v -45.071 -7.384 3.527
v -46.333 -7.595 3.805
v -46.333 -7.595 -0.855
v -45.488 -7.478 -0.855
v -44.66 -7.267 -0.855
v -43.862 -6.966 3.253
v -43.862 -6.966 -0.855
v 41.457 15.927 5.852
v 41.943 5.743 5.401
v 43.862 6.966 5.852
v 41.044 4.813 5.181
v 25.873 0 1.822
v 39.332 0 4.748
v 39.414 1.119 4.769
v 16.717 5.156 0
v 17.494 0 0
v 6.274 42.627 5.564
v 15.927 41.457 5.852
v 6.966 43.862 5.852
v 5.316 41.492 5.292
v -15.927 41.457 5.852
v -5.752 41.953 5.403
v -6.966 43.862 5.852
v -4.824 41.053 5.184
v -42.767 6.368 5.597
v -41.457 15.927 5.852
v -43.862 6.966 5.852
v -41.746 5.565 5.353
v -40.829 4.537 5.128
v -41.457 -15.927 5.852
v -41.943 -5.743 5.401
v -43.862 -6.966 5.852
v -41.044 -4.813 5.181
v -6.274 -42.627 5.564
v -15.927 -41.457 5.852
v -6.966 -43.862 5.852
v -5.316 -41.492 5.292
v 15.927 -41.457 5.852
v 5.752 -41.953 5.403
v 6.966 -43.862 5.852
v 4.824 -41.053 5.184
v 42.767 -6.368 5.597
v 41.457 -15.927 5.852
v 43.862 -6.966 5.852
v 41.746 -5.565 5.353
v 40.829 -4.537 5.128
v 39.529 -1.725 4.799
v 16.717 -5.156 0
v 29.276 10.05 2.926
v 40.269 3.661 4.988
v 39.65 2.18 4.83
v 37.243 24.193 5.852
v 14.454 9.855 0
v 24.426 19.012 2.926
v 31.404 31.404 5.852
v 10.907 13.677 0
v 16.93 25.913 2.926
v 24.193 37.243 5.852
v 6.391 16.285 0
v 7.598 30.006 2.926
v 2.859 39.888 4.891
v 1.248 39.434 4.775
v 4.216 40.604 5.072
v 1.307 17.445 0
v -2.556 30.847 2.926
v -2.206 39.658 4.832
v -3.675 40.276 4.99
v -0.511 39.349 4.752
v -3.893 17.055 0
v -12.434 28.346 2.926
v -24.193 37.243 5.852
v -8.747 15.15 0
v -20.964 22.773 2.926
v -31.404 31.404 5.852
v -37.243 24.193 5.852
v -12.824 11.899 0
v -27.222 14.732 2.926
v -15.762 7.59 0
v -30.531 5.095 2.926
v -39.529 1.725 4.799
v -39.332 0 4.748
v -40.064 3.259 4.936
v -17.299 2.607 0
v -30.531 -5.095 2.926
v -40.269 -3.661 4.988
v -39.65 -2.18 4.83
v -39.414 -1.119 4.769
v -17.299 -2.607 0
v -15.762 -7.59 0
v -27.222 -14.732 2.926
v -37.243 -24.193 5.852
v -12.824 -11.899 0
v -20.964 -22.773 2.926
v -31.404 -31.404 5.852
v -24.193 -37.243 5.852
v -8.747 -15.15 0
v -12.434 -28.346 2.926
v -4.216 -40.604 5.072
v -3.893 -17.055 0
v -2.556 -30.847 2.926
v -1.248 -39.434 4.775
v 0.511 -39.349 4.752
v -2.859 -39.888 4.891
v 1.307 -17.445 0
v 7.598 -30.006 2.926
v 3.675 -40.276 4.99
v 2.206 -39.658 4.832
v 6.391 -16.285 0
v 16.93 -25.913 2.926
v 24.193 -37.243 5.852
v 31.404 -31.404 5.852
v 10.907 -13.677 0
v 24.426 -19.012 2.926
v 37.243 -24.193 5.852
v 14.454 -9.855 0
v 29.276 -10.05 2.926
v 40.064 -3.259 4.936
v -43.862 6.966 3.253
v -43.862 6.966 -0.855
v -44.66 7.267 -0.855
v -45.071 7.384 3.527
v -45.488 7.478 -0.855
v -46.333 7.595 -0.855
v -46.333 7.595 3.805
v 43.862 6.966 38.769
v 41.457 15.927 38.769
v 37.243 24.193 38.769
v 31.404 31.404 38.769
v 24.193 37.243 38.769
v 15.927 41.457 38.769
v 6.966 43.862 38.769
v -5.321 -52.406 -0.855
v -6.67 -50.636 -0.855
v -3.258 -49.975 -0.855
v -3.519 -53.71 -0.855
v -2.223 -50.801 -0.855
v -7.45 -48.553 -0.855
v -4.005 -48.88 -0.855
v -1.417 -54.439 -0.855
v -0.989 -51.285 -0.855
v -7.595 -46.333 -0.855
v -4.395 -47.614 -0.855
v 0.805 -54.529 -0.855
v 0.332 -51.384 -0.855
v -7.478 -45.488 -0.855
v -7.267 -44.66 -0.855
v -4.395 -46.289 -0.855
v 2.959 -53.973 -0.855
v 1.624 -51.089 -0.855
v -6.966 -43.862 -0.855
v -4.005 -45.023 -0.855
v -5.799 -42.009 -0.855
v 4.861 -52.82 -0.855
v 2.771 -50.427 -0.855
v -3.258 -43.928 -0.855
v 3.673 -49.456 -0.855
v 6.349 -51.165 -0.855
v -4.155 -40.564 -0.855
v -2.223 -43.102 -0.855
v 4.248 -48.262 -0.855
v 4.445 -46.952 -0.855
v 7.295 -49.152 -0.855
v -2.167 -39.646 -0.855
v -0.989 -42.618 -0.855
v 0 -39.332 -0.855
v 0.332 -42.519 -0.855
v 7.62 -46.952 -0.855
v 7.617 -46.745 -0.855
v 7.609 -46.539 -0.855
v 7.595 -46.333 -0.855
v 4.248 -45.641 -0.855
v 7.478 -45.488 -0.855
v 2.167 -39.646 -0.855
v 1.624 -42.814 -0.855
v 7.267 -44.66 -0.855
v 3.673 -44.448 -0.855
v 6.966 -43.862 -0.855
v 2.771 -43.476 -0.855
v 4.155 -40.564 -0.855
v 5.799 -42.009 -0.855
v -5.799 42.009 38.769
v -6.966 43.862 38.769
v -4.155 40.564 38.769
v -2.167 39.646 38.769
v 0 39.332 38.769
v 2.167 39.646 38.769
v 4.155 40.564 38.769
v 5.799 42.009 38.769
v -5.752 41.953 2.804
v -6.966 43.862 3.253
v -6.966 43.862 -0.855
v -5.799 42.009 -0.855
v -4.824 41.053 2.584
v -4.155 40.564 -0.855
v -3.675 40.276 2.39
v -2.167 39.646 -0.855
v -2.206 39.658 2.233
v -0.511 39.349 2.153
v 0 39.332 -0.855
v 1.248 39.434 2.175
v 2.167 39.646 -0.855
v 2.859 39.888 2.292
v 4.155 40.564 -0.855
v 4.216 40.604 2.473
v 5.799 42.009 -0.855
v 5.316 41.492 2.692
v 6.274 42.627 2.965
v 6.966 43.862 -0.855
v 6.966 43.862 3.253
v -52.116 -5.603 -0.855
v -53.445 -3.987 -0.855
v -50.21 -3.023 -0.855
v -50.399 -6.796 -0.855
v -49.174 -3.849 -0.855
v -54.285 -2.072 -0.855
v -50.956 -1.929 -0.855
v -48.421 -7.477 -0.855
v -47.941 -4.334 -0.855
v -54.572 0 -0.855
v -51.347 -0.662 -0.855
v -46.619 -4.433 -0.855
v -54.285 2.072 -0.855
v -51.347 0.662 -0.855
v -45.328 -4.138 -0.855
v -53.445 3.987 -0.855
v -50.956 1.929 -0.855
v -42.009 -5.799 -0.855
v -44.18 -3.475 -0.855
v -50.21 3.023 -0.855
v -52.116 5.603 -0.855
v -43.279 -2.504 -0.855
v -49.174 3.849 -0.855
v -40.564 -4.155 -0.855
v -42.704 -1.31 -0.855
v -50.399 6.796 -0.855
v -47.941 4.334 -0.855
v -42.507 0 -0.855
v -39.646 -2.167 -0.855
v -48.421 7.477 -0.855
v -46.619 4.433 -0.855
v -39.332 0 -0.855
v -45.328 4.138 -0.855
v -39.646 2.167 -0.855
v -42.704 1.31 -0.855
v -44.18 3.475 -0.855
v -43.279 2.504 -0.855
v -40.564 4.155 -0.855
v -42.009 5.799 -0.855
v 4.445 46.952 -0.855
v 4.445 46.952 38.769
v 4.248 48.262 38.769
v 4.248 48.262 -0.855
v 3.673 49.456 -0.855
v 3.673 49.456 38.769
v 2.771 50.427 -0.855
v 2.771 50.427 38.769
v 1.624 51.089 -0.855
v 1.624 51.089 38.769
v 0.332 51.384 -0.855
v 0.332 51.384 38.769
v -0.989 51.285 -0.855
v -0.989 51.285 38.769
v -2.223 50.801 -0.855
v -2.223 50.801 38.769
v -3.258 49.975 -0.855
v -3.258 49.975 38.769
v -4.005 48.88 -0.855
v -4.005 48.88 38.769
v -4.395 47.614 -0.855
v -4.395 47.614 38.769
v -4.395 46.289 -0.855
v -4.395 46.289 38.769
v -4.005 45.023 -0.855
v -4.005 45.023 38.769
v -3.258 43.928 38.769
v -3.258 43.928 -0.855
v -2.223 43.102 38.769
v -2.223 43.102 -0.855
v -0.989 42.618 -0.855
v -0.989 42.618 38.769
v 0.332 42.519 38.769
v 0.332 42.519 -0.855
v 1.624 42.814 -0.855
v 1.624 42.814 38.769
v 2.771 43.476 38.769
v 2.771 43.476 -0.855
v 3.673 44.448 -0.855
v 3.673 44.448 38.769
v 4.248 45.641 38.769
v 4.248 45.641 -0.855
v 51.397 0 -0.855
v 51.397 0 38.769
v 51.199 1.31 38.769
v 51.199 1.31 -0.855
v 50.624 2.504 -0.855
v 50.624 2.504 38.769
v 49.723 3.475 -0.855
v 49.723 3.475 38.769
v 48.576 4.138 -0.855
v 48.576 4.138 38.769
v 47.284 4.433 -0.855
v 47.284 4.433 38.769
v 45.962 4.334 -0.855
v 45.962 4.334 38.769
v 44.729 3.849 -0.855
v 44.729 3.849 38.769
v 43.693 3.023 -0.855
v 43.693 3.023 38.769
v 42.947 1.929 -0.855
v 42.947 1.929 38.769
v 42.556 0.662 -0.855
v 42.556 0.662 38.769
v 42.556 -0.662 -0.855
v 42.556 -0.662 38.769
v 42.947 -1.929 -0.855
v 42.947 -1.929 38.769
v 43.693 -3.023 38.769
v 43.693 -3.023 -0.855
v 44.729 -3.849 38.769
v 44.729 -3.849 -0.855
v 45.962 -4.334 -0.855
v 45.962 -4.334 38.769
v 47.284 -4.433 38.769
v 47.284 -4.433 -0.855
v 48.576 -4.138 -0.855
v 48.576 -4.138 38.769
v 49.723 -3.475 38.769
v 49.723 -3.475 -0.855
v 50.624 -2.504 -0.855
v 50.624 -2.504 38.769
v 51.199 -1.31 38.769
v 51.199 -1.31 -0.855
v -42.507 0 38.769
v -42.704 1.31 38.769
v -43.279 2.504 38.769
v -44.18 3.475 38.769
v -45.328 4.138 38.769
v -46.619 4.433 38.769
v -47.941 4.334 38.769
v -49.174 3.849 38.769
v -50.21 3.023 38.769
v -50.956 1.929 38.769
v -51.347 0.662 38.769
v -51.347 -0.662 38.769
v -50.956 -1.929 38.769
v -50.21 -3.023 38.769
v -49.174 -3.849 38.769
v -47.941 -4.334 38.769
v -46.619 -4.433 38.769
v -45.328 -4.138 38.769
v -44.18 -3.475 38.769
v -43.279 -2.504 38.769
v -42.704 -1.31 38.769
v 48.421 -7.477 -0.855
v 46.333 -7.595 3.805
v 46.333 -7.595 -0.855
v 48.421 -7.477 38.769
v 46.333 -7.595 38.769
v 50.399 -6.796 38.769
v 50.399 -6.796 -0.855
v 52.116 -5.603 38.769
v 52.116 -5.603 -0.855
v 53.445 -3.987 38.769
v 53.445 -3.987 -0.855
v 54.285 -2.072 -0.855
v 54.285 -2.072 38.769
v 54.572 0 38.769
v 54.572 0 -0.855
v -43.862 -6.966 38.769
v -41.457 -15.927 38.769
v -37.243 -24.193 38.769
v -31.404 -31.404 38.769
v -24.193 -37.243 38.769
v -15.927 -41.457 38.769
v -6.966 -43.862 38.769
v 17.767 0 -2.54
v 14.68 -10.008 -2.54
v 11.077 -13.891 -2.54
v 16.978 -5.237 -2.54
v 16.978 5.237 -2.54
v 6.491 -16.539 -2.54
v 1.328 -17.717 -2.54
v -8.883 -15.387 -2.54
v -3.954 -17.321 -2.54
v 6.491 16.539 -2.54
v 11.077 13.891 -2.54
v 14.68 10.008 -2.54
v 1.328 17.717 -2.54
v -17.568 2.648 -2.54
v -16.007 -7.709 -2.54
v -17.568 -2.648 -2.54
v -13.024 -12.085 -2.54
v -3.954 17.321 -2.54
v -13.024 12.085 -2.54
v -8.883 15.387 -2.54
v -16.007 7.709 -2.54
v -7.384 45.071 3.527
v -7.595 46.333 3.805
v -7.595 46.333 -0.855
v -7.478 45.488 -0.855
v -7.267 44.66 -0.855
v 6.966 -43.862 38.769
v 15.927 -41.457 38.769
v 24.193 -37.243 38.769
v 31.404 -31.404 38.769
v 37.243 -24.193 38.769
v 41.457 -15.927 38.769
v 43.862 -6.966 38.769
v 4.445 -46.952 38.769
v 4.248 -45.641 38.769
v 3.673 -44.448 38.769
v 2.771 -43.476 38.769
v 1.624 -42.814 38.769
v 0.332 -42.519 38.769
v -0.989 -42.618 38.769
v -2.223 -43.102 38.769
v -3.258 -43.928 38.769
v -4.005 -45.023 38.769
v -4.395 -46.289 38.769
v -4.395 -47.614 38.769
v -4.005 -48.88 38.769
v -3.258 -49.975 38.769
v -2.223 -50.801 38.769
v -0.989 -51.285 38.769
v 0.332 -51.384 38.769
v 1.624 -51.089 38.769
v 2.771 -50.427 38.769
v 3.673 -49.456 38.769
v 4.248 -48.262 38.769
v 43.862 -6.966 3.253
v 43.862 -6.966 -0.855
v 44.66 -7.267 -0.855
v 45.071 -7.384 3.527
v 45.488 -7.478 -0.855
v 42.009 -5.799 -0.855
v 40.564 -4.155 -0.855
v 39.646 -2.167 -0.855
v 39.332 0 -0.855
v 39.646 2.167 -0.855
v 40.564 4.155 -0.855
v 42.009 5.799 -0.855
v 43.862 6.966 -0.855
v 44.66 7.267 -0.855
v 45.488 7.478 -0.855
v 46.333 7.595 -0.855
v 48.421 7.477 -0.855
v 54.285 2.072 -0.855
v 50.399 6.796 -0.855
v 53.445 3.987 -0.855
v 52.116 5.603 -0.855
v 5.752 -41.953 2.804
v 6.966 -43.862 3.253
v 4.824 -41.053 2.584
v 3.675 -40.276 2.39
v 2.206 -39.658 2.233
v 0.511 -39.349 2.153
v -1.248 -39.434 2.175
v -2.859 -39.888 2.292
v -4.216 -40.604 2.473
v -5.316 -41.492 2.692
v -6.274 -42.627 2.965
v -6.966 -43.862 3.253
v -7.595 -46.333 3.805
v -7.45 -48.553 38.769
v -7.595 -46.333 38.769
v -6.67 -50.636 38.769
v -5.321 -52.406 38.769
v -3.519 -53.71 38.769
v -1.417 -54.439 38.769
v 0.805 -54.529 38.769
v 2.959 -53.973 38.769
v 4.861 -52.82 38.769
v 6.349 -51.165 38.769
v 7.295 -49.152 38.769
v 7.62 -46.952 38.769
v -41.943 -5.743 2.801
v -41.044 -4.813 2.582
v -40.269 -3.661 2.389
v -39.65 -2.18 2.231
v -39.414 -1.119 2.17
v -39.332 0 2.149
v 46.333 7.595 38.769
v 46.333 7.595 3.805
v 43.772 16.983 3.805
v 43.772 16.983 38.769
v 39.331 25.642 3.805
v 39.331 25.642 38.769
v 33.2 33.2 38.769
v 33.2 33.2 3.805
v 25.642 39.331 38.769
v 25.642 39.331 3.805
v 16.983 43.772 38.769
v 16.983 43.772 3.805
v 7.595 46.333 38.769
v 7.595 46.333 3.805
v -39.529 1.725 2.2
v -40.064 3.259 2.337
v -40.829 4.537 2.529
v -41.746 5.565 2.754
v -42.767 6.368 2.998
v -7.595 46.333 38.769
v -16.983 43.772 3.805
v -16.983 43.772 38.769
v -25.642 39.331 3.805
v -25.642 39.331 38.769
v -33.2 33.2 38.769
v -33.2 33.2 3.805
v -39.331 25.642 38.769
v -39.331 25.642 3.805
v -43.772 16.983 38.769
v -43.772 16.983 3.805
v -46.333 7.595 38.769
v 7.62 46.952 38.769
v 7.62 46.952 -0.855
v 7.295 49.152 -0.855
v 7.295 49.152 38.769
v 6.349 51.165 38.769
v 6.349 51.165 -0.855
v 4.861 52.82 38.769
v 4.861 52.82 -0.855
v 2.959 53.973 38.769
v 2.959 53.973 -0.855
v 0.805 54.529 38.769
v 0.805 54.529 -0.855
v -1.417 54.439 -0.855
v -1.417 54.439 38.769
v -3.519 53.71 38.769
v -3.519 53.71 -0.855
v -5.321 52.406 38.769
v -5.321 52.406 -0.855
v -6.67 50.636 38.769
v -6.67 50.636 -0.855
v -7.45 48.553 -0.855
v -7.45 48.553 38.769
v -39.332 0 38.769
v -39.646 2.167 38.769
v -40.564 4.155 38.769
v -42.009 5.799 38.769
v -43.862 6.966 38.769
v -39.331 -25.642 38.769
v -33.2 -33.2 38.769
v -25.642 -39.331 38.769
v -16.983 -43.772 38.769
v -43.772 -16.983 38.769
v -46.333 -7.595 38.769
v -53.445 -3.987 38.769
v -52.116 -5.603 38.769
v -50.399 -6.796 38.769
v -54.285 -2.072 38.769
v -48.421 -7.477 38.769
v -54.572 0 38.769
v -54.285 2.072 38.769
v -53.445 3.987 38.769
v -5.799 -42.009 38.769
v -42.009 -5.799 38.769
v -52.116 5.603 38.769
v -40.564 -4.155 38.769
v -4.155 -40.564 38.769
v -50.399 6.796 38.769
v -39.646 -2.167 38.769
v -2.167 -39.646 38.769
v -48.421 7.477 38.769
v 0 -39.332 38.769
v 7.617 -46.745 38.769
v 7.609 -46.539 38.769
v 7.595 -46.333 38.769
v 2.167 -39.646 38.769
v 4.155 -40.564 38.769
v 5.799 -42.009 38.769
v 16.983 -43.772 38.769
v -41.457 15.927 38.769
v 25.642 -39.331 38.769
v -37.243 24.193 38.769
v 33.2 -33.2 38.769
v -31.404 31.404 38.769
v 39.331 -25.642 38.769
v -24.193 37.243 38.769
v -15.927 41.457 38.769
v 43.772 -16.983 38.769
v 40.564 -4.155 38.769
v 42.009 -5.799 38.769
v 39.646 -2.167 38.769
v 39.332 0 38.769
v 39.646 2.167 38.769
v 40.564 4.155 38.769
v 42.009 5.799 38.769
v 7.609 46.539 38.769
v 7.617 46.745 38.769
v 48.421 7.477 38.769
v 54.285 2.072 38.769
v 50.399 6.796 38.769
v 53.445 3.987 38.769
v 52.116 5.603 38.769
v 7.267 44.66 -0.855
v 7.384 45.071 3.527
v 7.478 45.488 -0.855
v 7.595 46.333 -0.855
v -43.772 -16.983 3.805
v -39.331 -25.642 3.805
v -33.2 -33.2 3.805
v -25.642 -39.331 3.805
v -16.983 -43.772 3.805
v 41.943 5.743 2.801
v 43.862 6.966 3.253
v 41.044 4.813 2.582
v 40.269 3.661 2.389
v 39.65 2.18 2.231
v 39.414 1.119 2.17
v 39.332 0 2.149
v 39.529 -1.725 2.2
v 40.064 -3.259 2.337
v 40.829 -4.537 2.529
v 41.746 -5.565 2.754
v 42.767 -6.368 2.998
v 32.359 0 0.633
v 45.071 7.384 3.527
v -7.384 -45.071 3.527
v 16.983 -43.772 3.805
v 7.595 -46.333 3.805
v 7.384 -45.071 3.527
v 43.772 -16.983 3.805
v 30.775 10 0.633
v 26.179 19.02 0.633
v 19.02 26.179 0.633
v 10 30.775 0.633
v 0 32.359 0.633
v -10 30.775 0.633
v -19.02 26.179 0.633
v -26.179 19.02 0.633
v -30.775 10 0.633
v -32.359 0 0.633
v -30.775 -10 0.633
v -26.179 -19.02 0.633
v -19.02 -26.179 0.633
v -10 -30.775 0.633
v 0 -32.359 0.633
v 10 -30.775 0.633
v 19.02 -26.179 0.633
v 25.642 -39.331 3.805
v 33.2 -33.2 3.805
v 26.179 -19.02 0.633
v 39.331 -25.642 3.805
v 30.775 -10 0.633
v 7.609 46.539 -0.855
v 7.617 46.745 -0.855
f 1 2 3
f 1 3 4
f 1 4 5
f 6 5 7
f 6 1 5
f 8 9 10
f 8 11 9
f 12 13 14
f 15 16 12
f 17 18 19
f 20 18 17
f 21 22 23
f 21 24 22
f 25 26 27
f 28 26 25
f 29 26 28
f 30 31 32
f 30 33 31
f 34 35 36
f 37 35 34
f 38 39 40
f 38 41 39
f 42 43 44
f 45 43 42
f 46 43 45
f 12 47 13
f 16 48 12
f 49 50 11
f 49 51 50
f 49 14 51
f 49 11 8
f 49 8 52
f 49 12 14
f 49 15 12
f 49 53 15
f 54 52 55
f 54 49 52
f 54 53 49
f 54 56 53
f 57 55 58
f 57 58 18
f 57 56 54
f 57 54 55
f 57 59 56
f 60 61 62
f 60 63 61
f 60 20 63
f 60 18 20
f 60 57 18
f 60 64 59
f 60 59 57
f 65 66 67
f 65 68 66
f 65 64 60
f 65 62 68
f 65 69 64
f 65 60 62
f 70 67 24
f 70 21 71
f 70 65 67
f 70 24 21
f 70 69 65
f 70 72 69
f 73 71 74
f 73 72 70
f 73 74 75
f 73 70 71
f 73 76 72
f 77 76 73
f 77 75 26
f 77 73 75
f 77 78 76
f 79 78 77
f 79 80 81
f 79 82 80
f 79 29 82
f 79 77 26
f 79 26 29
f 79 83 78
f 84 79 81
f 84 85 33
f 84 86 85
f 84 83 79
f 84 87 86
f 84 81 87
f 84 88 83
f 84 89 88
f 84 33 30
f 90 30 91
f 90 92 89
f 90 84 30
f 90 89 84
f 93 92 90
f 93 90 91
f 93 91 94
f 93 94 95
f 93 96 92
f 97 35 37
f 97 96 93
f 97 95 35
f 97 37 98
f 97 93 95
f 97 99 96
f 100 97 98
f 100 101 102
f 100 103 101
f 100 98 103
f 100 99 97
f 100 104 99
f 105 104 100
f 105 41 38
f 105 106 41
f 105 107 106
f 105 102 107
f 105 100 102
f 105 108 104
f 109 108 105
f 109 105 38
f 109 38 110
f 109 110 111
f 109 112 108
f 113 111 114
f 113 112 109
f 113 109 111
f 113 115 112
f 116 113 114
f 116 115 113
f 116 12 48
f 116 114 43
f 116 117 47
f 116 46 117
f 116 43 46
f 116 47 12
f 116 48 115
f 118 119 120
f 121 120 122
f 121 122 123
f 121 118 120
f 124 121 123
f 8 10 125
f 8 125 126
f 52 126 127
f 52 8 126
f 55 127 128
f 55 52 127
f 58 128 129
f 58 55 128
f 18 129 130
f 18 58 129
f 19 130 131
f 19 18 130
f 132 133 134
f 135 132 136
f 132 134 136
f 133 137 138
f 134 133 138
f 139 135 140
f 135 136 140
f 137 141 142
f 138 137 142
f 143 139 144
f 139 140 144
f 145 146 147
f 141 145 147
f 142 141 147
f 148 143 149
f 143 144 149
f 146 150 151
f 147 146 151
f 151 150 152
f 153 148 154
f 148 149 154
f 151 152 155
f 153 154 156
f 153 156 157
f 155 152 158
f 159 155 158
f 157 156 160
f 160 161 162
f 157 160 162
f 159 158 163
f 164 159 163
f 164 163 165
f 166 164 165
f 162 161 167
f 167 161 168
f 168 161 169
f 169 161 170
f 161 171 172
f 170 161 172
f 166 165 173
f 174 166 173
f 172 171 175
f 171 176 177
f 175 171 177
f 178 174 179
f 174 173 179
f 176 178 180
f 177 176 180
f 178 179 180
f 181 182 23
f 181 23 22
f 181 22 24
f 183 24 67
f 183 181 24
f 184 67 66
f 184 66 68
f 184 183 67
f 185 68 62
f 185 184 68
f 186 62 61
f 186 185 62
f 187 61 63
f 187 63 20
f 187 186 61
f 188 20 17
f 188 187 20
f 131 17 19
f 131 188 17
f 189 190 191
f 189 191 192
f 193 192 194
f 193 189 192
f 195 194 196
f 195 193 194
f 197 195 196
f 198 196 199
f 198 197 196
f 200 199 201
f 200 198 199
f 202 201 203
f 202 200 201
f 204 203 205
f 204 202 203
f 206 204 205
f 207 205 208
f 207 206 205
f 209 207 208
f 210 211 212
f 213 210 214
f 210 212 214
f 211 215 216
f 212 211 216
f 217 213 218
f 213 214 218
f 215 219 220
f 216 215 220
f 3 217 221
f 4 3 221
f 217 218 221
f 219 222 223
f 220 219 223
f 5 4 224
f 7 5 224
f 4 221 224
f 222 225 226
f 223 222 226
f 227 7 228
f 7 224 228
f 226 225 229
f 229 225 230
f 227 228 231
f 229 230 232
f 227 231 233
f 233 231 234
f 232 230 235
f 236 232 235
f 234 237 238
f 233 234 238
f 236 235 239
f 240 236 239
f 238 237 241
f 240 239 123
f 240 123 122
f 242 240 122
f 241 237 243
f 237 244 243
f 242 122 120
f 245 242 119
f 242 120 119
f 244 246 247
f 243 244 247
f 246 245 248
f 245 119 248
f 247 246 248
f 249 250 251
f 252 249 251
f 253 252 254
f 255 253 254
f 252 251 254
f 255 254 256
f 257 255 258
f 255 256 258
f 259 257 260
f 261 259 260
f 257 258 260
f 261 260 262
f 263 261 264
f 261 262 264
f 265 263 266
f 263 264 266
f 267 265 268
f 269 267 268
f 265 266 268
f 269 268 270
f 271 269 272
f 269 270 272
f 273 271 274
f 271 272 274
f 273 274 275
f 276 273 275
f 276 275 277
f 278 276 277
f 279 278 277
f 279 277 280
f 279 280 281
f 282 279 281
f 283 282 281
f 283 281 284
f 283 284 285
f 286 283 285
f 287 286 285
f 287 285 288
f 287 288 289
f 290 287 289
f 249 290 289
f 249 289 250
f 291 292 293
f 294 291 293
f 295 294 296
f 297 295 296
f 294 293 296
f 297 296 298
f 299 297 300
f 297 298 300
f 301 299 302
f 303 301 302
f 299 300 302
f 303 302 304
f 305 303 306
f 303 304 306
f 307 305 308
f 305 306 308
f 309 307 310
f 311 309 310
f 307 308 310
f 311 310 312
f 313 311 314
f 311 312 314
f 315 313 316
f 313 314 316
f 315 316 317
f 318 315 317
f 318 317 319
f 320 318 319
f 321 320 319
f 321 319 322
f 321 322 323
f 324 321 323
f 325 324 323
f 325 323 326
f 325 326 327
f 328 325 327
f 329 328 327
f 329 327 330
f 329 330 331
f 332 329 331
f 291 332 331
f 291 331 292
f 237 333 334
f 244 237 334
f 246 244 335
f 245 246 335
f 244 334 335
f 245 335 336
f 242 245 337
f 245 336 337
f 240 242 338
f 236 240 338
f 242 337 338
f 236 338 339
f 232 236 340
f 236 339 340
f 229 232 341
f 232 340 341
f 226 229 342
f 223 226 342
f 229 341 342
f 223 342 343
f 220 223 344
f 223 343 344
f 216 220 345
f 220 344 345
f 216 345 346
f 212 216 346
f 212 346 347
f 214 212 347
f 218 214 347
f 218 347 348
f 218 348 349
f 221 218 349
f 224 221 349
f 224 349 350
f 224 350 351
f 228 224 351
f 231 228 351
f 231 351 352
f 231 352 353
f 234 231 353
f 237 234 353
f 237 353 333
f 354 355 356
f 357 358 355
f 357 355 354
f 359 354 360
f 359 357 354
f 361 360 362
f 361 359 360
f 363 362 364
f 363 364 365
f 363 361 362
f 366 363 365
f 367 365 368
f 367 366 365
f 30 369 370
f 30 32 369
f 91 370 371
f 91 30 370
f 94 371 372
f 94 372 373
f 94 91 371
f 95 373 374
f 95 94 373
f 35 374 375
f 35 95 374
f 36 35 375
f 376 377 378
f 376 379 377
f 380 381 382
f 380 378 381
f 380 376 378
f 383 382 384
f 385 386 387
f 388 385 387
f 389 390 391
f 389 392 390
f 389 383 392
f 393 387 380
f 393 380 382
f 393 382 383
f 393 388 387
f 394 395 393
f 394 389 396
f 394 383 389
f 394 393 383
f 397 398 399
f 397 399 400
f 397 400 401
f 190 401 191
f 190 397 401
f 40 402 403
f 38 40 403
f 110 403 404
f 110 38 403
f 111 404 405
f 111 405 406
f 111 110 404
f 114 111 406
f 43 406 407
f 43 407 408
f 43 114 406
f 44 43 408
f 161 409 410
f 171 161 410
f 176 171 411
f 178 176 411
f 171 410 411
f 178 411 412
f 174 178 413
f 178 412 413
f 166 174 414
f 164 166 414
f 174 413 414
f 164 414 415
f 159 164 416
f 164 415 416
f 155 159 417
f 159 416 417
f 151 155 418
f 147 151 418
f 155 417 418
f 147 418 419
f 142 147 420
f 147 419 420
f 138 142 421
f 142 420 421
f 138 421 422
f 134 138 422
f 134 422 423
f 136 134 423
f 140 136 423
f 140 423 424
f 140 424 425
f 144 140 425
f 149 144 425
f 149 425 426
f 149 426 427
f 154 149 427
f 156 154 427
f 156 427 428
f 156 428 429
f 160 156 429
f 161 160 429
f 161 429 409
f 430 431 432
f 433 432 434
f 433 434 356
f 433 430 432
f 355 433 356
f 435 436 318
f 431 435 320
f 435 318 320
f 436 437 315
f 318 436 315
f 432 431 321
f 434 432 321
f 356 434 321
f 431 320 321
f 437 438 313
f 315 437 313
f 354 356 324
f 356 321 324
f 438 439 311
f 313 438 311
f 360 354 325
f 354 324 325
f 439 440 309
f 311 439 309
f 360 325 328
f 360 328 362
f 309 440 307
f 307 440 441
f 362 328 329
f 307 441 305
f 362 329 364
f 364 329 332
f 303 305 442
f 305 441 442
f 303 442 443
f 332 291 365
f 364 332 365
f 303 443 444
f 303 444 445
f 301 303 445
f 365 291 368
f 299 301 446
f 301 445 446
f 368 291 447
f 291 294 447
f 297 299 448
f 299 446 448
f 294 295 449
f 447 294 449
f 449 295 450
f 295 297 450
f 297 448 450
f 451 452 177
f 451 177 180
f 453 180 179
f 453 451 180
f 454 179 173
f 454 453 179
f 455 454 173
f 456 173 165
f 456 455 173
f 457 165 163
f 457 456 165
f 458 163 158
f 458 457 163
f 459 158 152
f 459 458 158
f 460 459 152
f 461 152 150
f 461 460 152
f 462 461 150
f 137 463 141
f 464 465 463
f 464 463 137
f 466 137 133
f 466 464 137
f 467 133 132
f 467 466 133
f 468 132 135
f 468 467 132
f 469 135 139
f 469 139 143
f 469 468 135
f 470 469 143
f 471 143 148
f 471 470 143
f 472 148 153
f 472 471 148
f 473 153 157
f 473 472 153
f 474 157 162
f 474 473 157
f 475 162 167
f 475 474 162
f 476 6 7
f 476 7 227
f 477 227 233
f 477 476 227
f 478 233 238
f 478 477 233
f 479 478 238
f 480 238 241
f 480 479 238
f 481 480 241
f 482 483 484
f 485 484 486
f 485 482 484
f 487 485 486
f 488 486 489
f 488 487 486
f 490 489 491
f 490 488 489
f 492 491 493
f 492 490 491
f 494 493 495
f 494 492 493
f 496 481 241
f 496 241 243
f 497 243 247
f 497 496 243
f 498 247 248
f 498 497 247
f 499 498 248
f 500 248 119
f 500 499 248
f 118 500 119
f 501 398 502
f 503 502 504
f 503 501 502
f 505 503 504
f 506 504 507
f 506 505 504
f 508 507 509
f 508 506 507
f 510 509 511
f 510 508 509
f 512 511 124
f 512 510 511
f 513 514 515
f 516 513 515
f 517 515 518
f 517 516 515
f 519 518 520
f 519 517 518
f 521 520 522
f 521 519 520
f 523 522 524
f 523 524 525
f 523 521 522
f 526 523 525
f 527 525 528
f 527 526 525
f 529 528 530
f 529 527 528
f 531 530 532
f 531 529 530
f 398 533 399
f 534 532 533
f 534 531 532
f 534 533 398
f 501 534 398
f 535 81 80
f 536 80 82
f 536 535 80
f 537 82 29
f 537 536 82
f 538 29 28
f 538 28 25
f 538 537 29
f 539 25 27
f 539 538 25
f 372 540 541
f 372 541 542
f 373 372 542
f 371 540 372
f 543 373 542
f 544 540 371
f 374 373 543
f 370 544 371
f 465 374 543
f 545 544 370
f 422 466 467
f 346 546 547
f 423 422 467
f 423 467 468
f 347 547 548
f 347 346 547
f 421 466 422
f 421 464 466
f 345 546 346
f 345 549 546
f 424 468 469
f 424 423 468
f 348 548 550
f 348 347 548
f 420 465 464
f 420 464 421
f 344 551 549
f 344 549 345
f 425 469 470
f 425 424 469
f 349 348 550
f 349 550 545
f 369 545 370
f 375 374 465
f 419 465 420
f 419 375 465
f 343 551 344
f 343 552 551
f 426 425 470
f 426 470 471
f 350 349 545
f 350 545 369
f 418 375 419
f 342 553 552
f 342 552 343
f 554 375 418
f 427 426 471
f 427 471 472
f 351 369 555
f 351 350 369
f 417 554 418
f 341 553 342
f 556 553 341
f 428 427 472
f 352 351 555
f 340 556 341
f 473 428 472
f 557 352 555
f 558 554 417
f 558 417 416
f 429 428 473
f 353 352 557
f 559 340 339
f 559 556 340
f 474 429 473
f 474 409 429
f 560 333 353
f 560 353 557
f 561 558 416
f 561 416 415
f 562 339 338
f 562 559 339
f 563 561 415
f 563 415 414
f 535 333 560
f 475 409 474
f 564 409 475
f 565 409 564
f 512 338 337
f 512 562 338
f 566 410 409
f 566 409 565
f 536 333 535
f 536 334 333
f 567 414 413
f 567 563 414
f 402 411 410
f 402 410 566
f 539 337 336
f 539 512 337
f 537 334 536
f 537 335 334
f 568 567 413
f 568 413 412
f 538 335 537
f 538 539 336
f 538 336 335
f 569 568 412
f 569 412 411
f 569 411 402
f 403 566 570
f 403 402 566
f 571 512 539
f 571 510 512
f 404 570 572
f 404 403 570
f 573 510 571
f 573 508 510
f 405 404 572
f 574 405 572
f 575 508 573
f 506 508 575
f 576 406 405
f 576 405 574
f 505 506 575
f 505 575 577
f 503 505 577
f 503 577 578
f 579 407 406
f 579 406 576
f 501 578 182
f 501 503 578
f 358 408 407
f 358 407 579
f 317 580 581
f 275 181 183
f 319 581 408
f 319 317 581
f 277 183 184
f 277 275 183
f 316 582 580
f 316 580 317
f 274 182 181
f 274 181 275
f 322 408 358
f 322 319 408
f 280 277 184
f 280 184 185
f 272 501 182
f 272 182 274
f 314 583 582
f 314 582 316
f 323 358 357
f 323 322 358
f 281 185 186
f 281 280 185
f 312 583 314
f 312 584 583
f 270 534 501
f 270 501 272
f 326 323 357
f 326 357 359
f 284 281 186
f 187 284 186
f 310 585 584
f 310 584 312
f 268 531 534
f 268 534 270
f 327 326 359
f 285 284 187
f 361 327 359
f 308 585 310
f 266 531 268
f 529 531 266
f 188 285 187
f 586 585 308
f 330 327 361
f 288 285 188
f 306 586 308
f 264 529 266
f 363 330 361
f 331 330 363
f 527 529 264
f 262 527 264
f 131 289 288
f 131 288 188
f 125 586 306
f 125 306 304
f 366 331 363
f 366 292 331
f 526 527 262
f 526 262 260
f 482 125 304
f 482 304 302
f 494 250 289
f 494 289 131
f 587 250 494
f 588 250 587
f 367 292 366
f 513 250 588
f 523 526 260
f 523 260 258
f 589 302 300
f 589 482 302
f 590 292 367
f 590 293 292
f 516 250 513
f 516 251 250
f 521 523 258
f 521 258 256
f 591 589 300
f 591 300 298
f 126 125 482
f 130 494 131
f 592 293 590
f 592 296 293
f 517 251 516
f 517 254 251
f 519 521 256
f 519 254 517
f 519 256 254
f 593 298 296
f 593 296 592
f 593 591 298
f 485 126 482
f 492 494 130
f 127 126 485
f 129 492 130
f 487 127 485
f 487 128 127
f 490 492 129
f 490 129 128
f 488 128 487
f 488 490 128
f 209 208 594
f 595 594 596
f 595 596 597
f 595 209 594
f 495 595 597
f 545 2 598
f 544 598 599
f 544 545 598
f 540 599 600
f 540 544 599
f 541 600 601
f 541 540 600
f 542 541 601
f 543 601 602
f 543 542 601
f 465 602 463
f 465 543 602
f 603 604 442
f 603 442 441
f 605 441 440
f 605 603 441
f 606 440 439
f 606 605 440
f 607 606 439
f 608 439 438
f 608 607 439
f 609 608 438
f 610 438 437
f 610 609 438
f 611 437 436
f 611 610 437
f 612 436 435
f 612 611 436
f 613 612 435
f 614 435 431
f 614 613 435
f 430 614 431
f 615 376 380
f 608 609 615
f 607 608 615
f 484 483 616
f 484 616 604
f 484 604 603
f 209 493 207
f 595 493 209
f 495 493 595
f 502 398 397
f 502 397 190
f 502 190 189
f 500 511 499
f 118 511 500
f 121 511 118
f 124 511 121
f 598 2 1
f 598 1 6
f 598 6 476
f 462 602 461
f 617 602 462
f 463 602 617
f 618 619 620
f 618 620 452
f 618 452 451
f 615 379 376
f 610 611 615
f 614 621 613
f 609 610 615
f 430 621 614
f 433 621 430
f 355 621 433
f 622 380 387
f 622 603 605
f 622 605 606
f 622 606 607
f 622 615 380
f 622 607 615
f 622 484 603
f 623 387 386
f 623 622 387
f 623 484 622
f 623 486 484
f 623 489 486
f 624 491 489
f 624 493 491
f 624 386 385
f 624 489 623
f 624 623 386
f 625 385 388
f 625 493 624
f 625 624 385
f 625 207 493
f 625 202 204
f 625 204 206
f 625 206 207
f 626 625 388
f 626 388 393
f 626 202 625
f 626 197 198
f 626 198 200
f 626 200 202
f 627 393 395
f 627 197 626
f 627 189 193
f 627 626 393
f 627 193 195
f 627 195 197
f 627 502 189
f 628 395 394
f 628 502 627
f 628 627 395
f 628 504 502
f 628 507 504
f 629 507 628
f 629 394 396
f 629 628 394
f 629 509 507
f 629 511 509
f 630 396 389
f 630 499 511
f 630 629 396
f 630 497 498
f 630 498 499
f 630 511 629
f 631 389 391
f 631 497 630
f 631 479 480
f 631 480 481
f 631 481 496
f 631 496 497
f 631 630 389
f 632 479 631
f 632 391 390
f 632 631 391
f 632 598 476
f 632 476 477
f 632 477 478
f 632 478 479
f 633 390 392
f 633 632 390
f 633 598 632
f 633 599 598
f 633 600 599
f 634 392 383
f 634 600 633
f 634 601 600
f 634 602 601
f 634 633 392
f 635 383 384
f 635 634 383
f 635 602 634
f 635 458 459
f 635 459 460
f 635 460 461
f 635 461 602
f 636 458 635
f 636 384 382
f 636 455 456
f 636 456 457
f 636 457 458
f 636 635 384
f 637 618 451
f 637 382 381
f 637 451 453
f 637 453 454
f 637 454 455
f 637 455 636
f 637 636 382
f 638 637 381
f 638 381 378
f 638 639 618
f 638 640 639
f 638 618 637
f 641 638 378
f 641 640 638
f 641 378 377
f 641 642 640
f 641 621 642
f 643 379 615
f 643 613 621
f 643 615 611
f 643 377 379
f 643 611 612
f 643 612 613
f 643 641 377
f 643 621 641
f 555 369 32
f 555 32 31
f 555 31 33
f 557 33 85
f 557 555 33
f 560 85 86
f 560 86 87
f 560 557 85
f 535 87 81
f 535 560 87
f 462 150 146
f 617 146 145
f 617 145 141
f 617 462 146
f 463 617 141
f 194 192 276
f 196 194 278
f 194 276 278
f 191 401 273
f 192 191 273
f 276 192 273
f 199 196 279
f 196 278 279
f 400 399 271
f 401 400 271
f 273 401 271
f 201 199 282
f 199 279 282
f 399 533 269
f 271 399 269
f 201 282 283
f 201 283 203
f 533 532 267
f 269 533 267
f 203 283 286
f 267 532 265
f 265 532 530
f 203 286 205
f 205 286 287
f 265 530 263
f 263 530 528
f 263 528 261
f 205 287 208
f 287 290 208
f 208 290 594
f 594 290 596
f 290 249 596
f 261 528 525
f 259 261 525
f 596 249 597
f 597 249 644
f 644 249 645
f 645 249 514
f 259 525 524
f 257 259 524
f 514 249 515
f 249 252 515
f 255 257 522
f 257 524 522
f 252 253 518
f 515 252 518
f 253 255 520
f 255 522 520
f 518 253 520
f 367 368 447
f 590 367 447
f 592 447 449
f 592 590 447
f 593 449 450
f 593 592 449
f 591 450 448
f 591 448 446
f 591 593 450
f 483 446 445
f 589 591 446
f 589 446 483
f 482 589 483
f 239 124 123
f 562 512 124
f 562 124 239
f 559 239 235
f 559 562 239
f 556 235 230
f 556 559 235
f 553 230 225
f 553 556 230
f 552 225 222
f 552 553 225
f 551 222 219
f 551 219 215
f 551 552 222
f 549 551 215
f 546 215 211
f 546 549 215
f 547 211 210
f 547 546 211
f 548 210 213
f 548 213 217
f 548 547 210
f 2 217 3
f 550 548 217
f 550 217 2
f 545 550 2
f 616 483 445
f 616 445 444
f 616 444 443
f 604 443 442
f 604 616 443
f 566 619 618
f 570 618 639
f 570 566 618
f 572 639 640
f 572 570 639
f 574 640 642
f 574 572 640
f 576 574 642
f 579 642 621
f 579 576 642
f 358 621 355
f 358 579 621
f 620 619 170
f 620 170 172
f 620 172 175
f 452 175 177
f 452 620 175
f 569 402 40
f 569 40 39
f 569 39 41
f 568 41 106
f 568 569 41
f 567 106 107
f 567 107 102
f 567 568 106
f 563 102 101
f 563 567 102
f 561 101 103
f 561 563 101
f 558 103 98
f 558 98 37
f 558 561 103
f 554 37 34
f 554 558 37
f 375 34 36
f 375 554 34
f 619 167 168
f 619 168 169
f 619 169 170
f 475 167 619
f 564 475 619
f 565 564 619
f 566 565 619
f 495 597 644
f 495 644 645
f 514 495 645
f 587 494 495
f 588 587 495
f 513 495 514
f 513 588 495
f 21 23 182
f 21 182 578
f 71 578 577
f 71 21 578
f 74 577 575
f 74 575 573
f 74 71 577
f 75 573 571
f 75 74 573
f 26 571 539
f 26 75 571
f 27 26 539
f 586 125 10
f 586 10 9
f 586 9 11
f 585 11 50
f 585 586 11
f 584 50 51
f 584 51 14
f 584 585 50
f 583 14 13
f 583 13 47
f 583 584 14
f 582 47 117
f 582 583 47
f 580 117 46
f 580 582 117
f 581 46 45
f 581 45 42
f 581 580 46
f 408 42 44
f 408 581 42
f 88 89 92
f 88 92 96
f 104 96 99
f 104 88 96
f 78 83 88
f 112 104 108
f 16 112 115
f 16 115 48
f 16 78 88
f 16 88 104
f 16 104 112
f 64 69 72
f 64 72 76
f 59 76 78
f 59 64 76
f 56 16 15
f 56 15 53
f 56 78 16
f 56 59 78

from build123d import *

# Parameters (mm, degrees)
F3_DEPTH = 39.624
F4_R     = 4.445
F5_DEPTH = 41.3102415224


with BuildPart() as f1:
    # F0 (on Front) → F1 (revolve)
    with BuildSketch(Plane.XZ):
        Polygon((17.4939688295, 0), (0, 0), (0, -2.54), (17.7669053052, -2.54), (46.9515744454, 3.8053627059), (46.9515744454, 38.7692414224), (44.4115744454, 38.7692414224), (44.4115744454, 5.8524552733), align=None)
    revolve(axis=Axis((0, 0, 19.3846207112), (0, 0, 1)))

    # F2 (on face) → F3 (join)
    with BuildSketch(Plane.XY.offset(38.7692414224)):
        with BuildLine():
            ThreePointArc((-7.5948700673, -46.333230964), (-0.3094269601, -54.5652893703), (7.62, -46.9515744454))
            ThreePointArc((7.62, -46.9515744454), (7.6137149248, -46.6421474854), (7.5948700673, -46.333230964))
            ThreePointArc((7.5948700673, -46.333230964), (0, -46.9515744454), (-7.5948700673, -46.333230964))
        make_face()
        with BuildLine():
            ThreePointArc((7.62, 46.9515744454), (-0.3094269601, 54.5652893703), (-7.5948700673, 46.333230964))
            ThreePointArc((-7.5948700673, 46.333230964), (0, 46.9515744454), (7.5948700673, 46.333230964))
            ThreePointArc((7.5948700673, 46.333230964), (7.6137149248, 46.6421474854), (7.62, 46.9515744454))
        make_face()
        with BuildLine():
            ThreePointArc((-46.333230964, 7.5948700673), (-54.5715744454, 0), (-46.333230964, -7.5948700673))
            ThreePointArc((-46.333230964, -7.5948700673), (-46.9515744454, 0), (-46.333230964, 7.5948700673))
        make_face()
        with BuildLine():
            ThreePointArc((-6.9655246042, -43.8619357953), (0, -44.4115744454), (6.9655246042, -43.8619357953))
            ThreePointArc((6.9655246042, -43.8619357953), (0, -39.3315744454), (-6.9655246042, -43.8619357953))
        make_face()
        with BuildLine():
            ThreePointArc((43.8619357953, 6.9655246042), (39.3315744454, 0), (43.8619357953, -6.9655246042))
            ThreePointArc((43.8619357953, -6.9655246042), (44.2739515495, -3.4935882577), (44.4115744454, 0))
            ThreePointArc((44.4115744454, 0), (44.2739515495, 3.4935882577), (43.8619357953, 6.9655246042))
        make_face()
        with BuildLine():
            ThreePointArc((-6.9655246042, 43.8619357953), (0, 39.3315744454), (6.9655246042, 43.8619357953))
            ThreePointArc((6.9655246042, 43.8619357953), (0, 44.4115744454), (-6.9655246042, 43.8619357953))
        make_face()
        with BuildLine():
            ThreePointArc((-43.8619357953, 6.9655246042), (-44.4115744454, 0), (-43.8619357953, -6.9655246042))
            ThreePointArc((-43.8619357953, -6.9655246042), (-40.5637952338, -4.1545970614), (-39.3315744454, 0))
            ThreePointArc((-39.3315744454, 0), (-40.5637952338, 4.1545970614), (-43.8619357953, 6.9655246042))
        make_face()
        with BuildLine():
            ThreePointArc((-7.5948700673, -46.333230964), (0, -46.9515744454), (7.5948700673, -46.333230964))
            ThreePointArc((7.5948700673, -46.333230964), (7.3843143351, -45.0710687156), (6.9655246042, -43.8619357953))
            ThreePointArc((6.9655246042, -43.8619357953), (0, -44.4115744454), (-6.9655246042, -43.8619357953))
            ThreePointArc((-6.9655246042, -43.8619357953), (-7.3843143351, -45.0710687156), (-7.5948700673, -46.333230964))
        make_face()
        with BuildLine():
            ThreePointArc((43.8619357953, -6.9655246042), (45.0710687156, -7.3843143351), (46.333230964, -7.5948700673))
            ThreePointArc((46.333230964, -7.5948700673), (46.7967332504, -3.81), (46.9515744454, 0))
            ThreePointArc((46.9515744454, 0), (46.7967332504, 3.81), (46.333230964, 7.5948700673))
            ThreePointArc((46.333230964, 7.5948700673), (45.0710687156, 7.3843143351), (43.8619357953, 6.9655246042))
            ThreePointArc((43.8619357953, 6.9655246042), (44.2739515495, 3.4935882577), (44.4115744454, 0))
            ThreePointArc((44.4115744454, 0), (44.2739515495, -3.4935882577), (43.8619357953, -6.9655246042))
        make_face()
        with BuildLine():
            ThreePointArc((7.5948700673, 46.333230964), (0, 46.9515744454), (-7.5948700673, 46.333230964))
            ThreePointArc((-7.5948700673, 46.333230964), (-7.3843143351, 45.0710687156), (-6.9655246042, 43.8619357953))
            ThreePointArc((-6.9655246042, 43.8619357953), (0, 44.4115744454), (6.9655246042, 43.8619357953))
            ThreePointArc((6.9655246042, 43.8619357953), (7.3843143351, 45.0710687156), (7.5948700673, 46.333230964))
        make_face()
        with BuildLine():
            ThreePointArc((-46.333230964, 7.5948700673), (-46.9515744454, 0), (-46.333230964, -7.5948700673))
            ThreePointArc((-46.333230964, -7.5948700673), (-45.0710687156, -7.3843143351), (-43.8619357953, -6.9655246042))
            ThreePointArc((-43.8619357953, -6.9655246042), (-44.4115744454, 0), (-43.8619357953, 6.9655246042))
            ThreePointArc((-43.8619357953, 6.9655246042), (-45.0710687156, 7.3843143351), (-46.333230964, 7.5948700673))
        make_face()
        with BuildLine():
            ThreePointArc((46.9515744454, 0), (46.7967332504, -3.81), (46.333230964, -7.5948700673))
            ThreePointArc((46.333230964, -7.5948700673), (52.116485997, -5.6025073551), (54.5715744454, 0))
            ThreePointArc((54.5715744454, 0), (52.116485997, 5.6025073551), (46.333230964, 7.5948700673))
            ThreePointArc((46.333230964, 7.5948700673), (46.7967332504, 3.81), (46.9515744454, 0))
        make_face()
    extrude(amount=-F3_DEPTH)

    # F4 (on face) → F5 (cut, through all)
    with BuildSketch(Plane.XY.offset(38.7692414224)):
        with Locations((-46.9515744454, 0)):
            Circle(F4_R)
        with Locations((0, 46.9515744454)):
            Circle(F4_R)
        with Locations((46.9515744454, 0)):
            Circle(F4_R)
        with Locations((0, -46.9515744454)):
            Circle(F4_R)
    extrude(amount=-F5_DEPTH, mode=Mode.SUBTRACT)


solid = f1.part
